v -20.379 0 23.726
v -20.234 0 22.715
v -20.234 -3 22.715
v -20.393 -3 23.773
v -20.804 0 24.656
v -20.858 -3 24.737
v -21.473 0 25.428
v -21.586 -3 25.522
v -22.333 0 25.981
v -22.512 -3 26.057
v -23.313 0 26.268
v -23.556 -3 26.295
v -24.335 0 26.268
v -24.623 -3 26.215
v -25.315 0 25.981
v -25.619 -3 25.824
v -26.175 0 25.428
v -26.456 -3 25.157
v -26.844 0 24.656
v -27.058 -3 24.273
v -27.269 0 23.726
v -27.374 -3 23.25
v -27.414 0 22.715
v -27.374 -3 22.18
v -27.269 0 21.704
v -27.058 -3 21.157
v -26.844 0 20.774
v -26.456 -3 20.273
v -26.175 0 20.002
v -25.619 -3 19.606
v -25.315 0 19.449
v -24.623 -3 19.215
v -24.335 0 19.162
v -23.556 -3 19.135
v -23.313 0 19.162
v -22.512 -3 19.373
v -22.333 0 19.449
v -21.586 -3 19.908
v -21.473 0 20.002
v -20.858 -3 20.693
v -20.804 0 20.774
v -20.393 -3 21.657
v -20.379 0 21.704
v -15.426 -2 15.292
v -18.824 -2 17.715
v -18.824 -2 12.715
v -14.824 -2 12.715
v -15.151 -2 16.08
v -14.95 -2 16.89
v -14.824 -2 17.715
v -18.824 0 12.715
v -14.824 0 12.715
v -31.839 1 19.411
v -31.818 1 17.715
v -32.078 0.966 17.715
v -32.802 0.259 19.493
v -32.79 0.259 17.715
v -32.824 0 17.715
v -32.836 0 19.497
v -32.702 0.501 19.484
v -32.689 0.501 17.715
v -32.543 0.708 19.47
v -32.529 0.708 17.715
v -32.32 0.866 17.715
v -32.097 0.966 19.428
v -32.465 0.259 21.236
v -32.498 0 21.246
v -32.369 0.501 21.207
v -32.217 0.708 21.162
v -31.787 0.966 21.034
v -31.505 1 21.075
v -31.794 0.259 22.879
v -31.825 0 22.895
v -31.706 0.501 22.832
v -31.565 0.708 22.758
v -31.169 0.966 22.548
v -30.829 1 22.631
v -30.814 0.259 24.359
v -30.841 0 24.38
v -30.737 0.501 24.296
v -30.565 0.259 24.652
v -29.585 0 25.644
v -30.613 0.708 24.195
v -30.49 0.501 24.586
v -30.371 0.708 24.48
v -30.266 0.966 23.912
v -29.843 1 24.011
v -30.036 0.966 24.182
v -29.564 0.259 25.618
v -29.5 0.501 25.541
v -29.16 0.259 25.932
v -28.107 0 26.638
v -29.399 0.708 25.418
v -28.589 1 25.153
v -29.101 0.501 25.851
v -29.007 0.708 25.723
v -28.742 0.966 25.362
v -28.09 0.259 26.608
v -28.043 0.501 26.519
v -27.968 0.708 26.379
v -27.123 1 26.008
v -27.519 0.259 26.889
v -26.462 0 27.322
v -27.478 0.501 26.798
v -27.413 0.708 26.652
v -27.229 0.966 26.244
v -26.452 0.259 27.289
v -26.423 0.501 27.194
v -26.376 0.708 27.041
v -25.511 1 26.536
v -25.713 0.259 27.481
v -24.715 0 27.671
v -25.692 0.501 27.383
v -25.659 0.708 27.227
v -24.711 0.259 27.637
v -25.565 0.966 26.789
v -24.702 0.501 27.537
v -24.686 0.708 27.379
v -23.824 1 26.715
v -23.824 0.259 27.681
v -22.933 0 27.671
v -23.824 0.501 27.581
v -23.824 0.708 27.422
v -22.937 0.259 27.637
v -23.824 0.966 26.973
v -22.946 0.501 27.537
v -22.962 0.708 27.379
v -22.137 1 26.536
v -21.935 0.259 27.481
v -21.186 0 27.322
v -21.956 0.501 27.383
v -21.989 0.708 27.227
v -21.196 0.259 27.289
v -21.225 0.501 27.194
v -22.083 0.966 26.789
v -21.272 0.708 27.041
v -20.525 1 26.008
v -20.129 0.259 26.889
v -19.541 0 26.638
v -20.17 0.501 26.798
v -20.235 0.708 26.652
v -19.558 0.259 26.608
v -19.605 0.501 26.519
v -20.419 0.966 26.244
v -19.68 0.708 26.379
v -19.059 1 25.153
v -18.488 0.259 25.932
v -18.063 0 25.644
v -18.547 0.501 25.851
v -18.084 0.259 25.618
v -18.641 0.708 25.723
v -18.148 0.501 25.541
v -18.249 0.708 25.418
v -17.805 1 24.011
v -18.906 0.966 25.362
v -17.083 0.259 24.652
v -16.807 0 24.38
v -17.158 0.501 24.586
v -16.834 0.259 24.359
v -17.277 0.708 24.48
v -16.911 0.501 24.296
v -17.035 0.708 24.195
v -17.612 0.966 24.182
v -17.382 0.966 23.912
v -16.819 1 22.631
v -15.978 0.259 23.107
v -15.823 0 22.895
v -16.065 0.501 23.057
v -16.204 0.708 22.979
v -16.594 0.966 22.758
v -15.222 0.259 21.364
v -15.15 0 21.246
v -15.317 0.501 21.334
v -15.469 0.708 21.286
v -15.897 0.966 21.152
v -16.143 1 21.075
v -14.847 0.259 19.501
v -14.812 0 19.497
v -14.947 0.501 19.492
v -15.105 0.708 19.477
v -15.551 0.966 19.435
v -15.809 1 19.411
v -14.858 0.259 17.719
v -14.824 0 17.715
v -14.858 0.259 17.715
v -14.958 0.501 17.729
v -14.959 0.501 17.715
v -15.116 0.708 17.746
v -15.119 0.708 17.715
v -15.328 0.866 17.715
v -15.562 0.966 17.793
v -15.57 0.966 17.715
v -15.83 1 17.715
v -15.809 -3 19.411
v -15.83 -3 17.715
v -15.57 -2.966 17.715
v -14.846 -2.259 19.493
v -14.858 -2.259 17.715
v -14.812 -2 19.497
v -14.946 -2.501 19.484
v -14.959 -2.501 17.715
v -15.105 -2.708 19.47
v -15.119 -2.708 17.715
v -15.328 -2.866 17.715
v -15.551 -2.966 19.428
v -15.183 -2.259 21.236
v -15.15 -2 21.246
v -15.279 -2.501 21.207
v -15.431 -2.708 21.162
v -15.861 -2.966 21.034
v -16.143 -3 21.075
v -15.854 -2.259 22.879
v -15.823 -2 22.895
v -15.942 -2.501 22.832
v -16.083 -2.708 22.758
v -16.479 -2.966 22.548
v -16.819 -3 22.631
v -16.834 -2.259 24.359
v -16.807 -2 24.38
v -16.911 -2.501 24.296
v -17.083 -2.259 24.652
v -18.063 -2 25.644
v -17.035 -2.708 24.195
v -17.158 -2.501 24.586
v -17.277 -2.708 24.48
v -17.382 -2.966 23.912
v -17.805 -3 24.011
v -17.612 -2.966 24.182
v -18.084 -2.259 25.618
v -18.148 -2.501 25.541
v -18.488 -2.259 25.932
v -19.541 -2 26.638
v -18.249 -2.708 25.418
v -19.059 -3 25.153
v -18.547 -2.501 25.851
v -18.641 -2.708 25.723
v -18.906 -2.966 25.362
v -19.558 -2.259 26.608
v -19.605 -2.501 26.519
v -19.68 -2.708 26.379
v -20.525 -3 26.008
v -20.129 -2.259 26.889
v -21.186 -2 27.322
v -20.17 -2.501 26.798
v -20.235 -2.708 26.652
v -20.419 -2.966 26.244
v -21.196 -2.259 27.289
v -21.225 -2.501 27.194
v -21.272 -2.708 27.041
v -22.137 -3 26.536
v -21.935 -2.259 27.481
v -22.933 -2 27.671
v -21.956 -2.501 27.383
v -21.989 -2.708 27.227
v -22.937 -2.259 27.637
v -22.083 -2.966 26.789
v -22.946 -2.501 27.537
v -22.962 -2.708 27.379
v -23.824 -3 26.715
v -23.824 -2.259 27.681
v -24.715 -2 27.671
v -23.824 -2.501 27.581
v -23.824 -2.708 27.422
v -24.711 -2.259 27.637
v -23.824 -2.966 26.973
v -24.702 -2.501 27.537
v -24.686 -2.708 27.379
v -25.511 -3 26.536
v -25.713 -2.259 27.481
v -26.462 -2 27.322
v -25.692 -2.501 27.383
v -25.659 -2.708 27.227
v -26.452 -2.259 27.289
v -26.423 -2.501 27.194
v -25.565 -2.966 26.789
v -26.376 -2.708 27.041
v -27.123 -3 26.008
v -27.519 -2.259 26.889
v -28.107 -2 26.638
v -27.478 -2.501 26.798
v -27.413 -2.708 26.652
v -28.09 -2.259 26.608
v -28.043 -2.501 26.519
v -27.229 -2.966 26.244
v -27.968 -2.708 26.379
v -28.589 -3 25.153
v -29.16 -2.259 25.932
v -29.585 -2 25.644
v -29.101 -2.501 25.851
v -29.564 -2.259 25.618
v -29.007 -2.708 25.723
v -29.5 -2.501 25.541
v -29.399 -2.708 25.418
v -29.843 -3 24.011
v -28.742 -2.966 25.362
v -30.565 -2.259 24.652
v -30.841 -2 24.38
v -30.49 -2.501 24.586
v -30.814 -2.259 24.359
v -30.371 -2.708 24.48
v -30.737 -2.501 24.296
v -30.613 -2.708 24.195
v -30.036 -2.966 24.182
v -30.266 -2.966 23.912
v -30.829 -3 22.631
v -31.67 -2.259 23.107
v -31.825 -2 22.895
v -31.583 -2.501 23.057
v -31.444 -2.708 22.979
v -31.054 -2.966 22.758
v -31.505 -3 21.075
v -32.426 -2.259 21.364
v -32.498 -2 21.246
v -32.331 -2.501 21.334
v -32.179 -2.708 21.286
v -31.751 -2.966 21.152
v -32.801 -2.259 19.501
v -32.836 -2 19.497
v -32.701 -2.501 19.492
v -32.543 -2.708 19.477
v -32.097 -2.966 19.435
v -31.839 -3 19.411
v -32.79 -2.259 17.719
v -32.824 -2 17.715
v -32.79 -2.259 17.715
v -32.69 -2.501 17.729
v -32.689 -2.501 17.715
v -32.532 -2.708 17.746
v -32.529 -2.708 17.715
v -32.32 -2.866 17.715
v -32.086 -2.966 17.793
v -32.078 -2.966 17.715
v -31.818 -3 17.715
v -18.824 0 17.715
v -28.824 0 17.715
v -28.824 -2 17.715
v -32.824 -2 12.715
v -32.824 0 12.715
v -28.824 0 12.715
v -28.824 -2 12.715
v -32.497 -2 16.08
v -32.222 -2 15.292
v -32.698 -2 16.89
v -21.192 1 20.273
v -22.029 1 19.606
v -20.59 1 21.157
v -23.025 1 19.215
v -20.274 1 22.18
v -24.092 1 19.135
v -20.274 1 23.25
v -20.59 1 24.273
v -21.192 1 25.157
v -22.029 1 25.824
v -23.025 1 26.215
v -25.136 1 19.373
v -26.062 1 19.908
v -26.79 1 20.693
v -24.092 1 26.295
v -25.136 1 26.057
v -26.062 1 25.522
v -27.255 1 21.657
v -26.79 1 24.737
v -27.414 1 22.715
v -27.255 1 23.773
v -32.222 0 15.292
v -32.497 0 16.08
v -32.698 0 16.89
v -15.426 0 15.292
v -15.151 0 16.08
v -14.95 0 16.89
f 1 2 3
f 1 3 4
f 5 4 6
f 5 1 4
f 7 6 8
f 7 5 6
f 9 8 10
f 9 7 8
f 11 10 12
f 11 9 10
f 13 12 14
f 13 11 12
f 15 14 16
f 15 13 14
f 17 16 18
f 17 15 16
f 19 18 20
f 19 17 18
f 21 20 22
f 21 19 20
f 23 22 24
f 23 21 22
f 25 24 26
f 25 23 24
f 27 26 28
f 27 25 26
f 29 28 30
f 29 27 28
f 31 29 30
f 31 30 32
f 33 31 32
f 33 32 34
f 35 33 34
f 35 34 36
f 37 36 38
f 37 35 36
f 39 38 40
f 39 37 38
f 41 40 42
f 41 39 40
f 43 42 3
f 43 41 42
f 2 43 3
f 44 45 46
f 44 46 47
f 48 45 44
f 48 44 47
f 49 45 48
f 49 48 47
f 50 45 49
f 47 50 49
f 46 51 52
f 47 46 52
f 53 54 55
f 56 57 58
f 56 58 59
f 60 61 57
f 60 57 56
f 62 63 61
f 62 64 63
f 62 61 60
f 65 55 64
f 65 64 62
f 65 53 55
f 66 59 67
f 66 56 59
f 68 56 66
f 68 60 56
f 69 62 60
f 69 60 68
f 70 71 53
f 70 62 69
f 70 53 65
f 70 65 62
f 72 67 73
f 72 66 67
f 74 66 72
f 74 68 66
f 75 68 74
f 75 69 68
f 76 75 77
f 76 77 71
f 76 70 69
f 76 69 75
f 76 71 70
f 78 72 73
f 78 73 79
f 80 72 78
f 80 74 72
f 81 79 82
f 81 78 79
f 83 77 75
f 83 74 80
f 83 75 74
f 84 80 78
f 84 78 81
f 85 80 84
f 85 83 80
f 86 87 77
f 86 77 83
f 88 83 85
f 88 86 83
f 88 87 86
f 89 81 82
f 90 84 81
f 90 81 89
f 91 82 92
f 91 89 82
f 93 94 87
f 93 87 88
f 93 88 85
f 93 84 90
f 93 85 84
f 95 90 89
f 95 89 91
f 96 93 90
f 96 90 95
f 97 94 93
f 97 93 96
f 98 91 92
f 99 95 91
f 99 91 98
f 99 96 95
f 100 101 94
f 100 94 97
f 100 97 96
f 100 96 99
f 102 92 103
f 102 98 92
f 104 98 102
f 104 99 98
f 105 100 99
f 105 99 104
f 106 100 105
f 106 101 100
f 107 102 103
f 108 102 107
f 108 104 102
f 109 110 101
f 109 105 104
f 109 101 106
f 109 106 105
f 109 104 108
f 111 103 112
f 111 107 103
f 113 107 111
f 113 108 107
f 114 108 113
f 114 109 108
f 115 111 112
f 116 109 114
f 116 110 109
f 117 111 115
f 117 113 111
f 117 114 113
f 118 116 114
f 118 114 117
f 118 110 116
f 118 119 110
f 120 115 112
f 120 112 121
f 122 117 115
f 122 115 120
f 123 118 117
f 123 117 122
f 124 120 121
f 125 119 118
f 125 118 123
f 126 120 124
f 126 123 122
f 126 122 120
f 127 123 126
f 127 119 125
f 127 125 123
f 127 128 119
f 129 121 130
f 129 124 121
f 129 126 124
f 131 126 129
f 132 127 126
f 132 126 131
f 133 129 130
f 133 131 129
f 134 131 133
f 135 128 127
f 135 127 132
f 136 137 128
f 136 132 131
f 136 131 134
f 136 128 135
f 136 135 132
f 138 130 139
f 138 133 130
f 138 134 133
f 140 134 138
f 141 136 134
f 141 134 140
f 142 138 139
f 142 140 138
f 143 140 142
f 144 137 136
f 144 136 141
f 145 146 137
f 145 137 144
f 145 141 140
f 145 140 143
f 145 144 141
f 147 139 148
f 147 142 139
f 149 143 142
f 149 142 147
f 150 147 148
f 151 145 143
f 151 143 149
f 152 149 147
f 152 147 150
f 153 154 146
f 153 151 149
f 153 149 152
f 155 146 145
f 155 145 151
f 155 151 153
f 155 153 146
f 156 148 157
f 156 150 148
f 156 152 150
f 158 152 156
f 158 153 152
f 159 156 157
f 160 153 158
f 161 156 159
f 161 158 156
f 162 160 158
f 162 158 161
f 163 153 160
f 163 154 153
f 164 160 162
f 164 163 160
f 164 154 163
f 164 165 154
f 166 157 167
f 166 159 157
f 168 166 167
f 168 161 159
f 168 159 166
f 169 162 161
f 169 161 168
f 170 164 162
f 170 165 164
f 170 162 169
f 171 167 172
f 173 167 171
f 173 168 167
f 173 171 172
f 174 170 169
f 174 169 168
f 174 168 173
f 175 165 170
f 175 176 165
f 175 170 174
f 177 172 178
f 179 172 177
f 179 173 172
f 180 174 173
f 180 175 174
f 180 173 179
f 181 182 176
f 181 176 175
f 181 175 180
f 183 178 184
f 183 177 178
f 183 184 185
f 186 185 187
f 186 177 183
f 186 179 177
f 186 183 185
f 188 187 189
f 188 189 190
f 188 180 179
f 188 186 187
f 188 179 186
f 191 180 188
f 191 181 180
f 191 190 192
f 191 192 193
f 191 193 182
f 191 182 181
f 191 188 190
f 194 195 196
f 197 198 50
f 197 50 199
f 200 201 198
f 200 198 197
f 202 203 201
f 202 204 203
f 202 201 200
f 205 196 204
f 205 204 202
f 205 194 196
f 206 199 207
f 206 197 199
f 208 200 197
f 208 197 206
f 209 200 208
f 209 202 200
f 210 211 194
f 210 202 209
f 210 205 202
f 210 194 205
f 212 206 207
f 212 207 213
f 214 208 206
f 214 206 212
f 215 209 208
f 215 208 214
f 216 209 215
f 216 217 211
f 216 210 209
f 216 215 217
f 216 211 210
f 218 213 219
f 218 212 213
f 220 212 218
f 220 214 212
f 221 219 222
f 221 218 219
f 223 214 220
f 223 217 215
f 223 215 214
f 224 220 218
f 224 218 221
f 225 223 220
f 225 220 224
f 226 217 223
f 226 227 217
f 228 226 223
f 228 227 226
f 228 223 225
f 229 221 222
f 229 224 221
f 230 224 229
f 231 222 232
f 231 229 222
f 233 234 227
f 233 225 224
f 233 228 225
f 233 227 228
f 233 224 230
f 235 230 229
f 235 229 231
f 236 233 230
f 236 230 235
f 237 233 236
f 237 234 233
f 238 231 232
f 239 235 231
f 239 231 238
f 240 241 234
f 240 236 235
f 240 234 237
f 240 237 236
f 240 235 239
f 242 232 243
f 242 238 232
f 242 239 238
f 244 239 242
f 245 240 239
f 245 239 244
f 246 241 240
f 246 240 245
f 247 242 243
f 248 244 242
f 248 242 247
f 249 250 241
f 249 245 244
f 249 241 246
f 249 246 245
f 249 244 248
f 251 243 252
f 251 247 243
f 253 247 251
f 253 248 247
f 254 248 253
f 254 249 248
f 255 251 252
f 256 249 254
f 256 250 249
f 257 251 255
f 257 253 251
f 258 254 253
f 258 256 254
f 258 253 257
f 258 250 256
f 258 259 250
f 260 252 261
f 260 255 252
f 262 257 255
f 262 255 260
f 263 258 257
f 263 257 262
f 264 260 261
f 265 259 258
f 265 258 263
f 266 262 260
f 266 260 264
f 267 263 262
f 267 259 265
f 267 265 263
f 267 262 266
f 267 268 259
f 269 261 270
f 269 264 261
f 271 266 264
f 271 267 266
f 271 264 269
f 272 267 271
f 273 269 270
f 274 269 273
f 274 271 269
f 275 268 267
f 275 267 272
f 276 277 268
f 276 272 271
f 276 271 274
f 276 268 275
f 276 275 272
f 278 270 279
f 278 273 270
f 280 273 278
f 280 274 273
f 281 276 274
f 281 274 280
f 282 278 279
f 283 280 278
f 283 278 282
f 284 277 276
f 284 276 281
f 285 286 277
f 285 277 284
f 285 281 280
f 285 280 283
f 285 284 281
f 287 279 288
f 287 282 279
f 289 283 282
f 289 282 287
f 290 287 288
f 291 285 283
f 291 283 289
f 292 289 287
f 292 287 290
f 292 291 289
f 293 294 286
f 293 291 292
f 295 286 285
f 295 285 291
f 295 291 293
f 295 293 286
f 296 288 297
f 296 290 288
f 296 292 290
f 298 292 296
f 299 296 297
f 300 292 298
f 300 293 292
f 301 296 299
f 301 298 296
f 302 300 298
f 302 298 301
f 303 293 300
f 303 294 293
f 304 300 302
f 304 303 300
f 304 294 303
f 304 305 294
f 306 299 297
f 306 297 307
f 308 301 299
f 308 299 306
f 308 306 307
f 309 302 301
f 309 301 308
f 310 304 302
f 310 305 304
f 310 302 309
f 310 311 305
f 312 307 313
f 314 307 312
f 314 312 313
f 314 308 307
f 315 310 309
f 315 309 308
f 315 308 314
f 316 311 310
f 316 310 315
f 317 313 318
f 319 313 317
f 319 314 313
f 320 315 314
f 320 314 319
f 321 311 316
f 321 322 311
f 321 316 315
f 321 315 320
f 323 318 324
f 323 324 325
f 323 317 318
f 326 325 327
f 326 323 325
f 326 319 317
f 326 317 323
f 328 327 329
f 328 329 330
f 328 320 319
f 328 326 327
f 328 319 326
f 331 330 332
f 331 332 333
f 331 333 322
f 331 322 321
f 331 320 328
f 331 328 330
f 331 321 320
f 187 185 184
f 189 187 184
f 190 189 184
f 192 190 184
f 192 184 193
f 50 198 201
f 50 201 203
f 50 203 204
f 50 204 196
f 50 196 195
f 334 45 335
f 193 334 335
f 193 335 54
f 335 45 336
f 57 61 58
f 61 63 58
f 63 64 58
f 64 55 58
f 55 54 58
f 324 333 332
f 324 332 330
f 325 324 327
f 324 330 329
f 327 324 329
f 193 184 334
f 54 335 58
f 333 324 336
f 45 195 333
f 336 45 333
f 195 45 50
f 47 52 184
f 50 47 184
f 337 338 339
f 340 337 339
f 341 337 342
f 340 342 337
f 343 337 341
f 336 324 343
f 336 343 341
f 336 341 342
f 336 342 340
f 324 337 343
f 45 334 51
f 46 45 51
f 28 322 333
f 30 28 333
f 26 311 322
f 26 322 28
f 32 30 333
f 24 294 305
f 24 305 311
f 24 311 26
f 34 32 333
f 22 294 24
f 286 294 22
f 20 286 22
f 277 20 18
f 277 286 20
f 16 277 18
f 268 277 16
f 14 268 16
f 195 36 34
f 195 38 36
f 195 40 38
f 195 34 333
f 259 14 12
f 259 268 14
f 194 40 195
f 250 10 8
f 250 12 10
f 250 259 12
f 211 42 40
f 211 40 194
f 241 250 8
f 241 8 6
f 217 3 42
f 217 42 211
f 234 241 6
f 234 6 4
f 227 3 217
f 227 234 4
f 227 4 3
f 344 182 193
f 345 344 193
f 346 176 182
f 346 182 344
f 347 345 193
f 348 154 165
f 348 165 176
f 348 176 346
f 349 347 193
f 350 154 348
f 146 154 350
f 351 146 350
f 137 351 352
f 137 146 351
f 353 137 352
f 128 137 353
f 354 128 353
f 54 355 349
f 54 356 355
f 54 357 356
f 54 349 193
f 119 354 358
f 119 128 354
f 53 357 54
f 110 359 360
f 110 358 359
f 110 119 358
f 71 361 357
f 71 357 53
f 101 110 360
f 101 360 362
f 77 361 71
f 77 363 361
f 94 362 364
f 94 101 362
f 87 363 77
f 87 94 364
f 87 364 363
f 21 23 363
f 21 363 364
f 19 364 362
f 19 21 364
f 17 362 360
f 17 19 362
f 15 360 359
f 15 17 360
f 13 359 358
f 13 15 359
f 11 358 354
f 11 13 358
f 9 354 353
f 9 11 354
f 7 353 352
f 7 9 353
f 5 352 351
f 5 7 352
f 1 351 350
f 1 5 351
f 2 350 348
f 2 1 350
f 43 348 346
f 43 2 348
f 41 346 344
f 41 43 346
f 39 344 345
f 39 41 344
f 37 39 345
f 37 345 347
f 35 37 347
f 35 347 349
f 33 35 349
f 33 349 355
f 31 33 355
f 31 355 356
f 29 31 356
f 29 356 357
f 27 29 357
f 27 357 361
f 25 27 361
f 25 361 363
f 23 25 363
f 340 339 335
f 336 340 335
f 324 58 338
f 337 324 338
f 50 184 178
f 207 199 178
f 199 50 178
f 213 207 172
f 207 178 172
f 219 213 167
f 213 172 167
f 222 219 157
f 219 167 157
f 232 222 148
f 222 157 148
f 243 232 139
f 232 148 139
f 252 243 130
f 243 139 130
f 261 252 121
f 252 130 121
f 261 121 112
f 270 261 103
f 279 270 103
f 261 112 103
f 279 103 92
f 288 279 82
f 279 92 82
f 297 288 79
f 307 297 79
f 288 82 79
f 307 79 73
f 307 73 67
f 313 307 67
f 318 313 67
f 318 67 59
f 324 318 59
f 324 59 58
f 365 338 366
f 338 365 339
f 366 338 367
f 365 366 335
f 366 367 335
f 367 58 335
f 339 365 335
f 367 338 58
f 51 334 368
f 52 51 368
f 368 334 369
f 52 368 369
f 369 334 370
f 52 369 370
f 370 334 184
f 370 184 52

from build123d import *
from build123d import SkipClean  # not in build123d's __all__

# Parameters (mm, degrees)
F0_R        = 3.59
F1_DEPTH    = 2
F2_R        = 3.59
F3_DEPTH    = 1
F4_R        = 3.59
F5_DEPTH    = 1
F7_T3_ANGLE = 223.7642380541
F7_T6_ANGLE = 223.7642380541


# Not quite as in the source:
# - a fillet or chamfer that OpenCascade refuses, or shapes differently, is made with other operations: its cross-section is extruded or revolved along the edge and cut away or added
# - a feature of the source that left no trace in its solid (it failed there, or was rolled back) is left out


with BuildPart() as f1:
    # F0 (on Front) → F1 (new body)
    with BuildSketch(Plane.XZ):
        with BuildLine():
            Line((-28.8239947557, 12.7150369808), (-28.8239947557, 17.7150369808))
            Line((-28.8239947557, 17.7150369808), (-18.8239947557, 17.7150369808))
            Line((-18.8239947557, 17.7150369808), (-18.8239947557, 12.7150369808))
            Line((-18.8239947557, 12.7150369808), (-14.8239947557, 12.7150369808))
            Line((-14.8239947557, 12.7150369808), (-14.8239947557, 17.7150369808))
            ThreePointArc((-14.8239947557, 17.7150369808), (-23.8239947557, 27.7150369808), (-32.8239947557, 17.7150369808))
            Line((-32.8239947557, 17.7150369808), (-32.8239947557, 12.7150369808))
            Line((-32.8239947557, 12.7150369808), (-28.8239947557, 12.7150369808))
        make_face()
        with Locations((-23.8239947557, 22.7150369808)):
            Circle(F0_R, mode=Mode.SUBTRACT)
    extrude(amount=F1_DEPTH)

    # F2 (on face) → F3 (join)
    with BuildSketch(Plane.XZ.offset(2)):
        with BuildLine():
            Line((-32.8239947557, 17.7150369808), (-28.8239947557, 17.7150369808))
            Line((-28.8239947557, 17.7150369808), (-18.8239947557, 17.7150369808))
            Line((-18.8239947557, 17.7150369808), (-14.8239947557, 17.7150369808))
            ThreePointArc((-14.8239947557, 17.7150369808), (-23.8239947557, 27.7150369808), (-32.8239947557, 17.7150369808))
        make_face()
        with Locations((-23.8239947557, 22.7150369808)):
            Circle(F2_R, mode=Mode.SUBTRACT)
    extrude(amount=F3_DEPTH)

    # F4 (on face) → F5 (join)
    with BuildSketch(Plane(origin=(0, 0, 0), x_dir=(-1, 0, 0), z_dir=(0, 1, 0))):
        with BuildLine():
            Line((14.8239947557, 17.7150369808), (18.8239947557, 17.7150369808))
            Line((18.8239947557, 17.7150369808), (28.8239947557, 17.7150369808))
            Line((28.8239947557, 17.7150369808), (32.8239947557, 17.7150369808))
            ThreePointArc((32.8239947557, 17.7150369808), (23.8239947557, 27.7150369808), (14.8239947557, 17.7150369808))
        make_face()
        with Locations((23.8239947557, 22.7150369808)):
            Circle(F4_R, mode=Mode.SUBTRACT)
    with SkipClean():  # cleaning this boolean's faces spoils the solid; the shape is the same uncleaned
        extrude(amount=F5_DEPTH)

    # F7: fillet of radius 1 on 2 edges, made by hand


with BuildPart() as f7_tool1:
    # F7_s2 → F7_t3 (revolve)
    with BuildSketch(Plane(origin=(3.1459864442, 0, 7.8329498468), x_dir=(0, 1, 0), z_dir=(-0.3726982036, 0, -0.9279526114))):
        with BuildLine():
            ThreePointArc((-2, -20.0139639005), (-2.7071067812, -20.3068571193), (-3, -21.0139639005))
            Line((-3, -21.0139639005), (-3, -20.0139639005))
            Line((-3, -20.0139639005), (-2, -20.0139639005))
        make_face()
    revolve(axis=Axis((-23.8239947557, -3, 18.6650369808), (0, -1, 0)), revolution_arc=F7_T3_ANGLE)


with BuildPart() as f7_tool4:
    # F7_s5 → F7_t6 (revolve)
    with BuildSketch(Plane(origin=(-9.7644804416, 0, 24.3118293528), x_dir=(0, 1, 0), z_dir=(0.3726982036, 0, -0.9279526114))):
        with BuildLine():
            ThreePointArc((0, -24.2011123962), (0.7071067812, -23.9082191774), (1, -23.2011123962))
            Line((1, -23.2011123962), (1, -24.2011123962))
            Line((1, -24.2011123962), (0, -24.2011123962))
        make_face()
    revolve(axis=Axis((-23.8239947557, 1, 18.6650369808), (0, 1, 0)), revolution_arc=F7_T6_ANGLE)


with BuildPart() as f1_1:
    add(f1.part, clean=False)

    # F7_t7: cut F7_tool1, F7_tool4
    add([f7_tool1.part, f7_tool4.part], mode=Mode.SUBTRACT)


solid = f1_1.part
